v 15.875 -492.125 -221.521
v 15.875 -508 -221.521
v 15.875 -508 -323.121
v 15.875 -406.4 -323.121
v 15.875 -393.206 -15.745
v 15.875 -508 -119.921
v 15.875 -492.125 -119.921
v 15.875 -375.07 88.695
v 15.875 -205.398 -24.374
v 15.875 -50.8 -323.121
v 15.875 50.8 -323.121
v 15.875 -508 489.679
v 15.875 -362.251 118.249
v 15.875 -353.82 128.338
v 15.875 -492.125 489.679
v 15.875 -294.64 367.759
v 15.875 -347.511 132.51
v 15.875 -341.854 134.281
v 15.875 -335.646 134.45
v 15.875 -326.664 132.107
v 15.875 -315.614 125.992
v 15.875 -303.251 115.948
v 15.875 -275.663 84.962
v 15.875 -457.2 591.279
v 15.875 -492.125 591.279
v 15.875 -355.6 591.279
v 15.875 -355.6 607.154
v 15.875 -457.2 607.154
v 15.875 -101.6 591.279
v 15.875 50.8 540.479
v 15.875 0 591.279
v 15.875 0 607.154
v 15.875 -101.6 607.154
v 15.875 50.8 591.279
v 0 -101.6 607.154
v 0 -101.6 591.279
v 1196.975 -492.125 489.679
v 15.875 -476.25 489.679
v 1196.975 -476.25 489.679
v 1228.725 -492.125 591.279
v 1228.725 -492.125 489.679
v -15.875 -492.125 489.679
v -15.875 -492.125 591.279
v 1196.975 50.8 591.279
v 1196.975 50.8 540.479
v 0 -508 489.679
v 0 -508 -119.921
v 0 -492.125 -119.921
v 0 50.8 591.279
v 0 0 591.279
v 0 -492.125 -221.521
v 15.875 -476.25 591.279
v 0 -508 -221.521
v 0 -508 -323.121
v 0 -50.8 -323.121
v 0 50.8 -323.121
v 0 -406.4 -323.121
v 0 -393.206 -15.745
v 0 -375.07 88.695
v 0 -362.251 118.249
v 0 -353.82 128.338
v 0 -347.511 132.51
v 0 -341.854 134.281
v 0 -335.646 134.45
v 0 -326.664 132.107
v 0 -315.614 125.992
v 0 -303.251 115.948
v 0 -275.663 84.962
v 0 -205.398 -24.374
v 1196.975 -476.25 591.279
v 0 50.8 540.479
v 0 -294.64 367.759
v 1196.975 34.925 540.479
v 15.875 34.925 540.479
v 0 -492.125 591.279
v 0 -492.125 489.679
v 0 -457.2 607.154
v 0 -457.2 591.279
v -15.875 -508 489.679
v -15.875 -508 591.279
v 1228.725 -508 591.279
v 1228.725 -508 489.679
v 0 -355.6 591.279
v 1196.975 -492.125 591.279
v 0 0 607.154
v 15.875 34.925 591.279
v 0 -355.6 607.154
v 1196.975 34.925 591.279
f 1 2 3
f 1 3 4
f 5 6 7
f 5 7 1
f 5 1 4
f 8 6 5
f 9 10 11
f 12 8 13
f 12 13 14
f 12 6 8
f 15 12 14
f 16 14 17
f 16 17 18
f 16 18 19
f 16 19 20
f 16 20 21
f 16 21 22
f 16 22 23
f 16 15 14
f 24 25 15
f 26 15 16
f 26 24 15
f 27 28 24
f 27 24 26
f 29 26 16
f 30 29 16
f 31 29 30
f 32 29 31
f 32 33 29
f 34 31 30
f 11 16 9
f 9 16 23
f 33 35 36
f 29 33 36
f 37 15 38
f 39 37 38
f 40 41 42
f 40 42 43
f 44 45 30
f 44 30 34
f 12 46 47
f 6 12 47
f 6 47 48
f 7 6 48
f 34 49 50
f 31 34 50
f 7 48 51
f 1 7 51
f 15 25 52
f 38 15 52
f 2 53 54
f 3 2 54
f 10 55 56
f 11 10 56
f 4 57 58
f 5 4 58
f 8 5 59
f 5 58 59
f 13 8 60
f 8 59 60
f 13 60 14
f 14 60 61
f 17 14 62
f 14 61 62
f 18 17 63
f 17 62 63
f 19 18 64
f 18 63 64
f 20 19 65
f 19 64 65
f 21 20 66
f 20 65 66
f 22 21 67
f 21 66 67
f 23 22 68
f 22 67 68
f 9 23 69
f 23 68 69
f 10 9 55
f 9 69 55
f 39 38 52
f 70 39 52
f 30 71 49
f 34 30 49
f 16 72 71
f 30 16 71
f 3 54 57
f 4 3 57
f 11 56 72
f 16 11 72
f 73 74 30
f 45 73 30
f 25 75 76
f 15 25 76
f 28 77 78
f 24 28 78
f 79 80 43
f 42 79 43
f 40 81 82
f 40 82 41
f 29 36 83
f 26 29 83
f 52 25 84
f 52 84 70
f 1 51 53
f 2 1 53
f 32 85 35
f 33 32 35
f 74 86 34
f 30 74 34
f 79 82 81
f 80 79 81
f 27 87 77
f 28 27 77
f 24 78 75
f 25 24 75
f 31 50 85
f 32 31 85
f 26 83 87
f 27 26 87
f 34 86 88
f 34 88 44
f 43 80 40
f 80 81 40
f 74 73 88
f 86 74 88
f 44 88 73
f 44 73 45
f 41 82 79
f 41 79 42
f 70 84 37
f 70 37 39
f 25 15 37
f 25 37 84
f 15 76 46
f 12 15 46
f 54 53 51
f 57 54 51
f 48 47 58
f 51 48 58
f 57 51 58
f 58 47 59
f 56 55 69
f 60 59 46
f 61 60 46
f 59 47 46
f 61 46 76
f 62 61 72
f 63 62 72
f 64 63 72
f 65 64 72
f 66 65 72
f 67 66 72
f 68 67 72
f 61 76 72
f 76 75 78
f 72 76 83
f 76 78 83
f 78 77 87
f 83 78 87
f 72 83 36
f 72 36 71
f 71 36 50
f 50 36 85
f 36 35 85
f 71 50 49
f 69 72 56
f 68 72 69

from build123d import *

# Parameters (mm, degrees)
F1_DEPTH      = 15.875
F2_W          = 15.875
F2_H          = 50.8
F3_DEPTH      = 1181.1
F4_W          = 15.875
F4_H          = 101.6
F5_DEPTH      = 1181.1
F6_W          = 15.875
F6_H          = 101.6
F7_DEPTH      = 1212.85
F7_DEPTH_BACK = 31.75


with BuildPart() as f1:
    # F0 (on Right) → F1 (new body)
    with BuildSketch(Plane.YZ):
        with BuildLine():
            Line((-492.125, 489.6790781498), (-508, 489.6790781498))
            Line((-508, 489.6790781498), (-508, -119.9209218502))
            Line((-508, -119.9209218502), (-492.125, -119.9209218502))
            Line((-492.125, -119.9209218502), (-492.125, -221.5209218502))
            Line((-492.125, -221.5209218502), (-508, -221.5209218502))
            Line((-508, -221.5209218502), (-508, -323.1209218502))
            Line((-508, -323.1209218502), (-406.4, -323.1209218502))
            add(Edge.make_bspline(
                [(-406.4, -323.1209218502), (-401.7010466691, -100.4355481062), (-391.907715593, 363.674528608), (-167.5225646264, -88.1085703651), (-50.8, -323.1209218502)],
                knots=[0, 0, 0, 0, 0.4798115467, 1, 1, 1, 1], degree=3))
            Line((-50.8, -323.1209218502), (50.8, -323.1209218502))
            Line((50.8, -323.1209218502), (-294.64, 367.7590781498))
            Line((-294.64, 367.7590781498), (50.8, 540.4790781498))
            Line((50.8, 540.4790781498), (50.8, 591.2790781498))
            Line((50.8, 591.2790781498), (0, 591.2790781498))
            Line((0, 591.2790781498), (0, 607.1540781498))
            Line((0, 607.1540781498), (-101.6, 607.1540781498))
            Line((-101.6, 607.1540781498), (-101.6, 591.2790781498))
            Line((-101.6, 591.2790781498), (-355.6, 591.2790781498))
            Line((-355.6, 591.2790781498), (-355.6, 607.1540781498))
            Line((-355.6, 607.1540781498), (-457.2, 607.1540781498))
            Line((-457.2, 607.1540781498), (-457.2, 591.2790781498))
            Line((-457.2, 591.2790781498), (-492.125, 591.2790781498))
            Line((-492.125, 591.2790781498), (-492.125, 489.6790781498))
        make_face()
    extrude(amount=F1_DEPTH)


with BuildPart() as f3:
    # F2 (on face) → F3 (new body)
    with BuildSketch(Plane.YZ.offset(15.875)):
        with Locations((42.8625, 565.8790781498)):
            Rectangle(F2_W, F2_H)
    extrude(amount=F3_DEPTH)


with BuildPart() as f5:
    # F4 (on face) → F5 (new body)
    with BuildSketch(Plane.YZ.offset(15.875)):
        with Locations((-484.1875, 540.4790781498)):
            Rectangle(F4_W, F4_H)
    extrude(amount=F5_DEPTH)


with BuildPart() as f7:
    # F6 (on face) → F7 (new body, two sides)
    with BuildSketch(Plane.YZ.offset(15.875)) as f7_sk:
        with Locations((-500.0625, 540.4790781498)):
            Rectangle(F6_W, F6_H)
    extrude(amount=F7_DEPTH)
    extrude(f7_sk.sketch, amount=-F7_DEPTH_BACK)


solid = Compound([f1.part, f3.part, f5.part, f7.part])
